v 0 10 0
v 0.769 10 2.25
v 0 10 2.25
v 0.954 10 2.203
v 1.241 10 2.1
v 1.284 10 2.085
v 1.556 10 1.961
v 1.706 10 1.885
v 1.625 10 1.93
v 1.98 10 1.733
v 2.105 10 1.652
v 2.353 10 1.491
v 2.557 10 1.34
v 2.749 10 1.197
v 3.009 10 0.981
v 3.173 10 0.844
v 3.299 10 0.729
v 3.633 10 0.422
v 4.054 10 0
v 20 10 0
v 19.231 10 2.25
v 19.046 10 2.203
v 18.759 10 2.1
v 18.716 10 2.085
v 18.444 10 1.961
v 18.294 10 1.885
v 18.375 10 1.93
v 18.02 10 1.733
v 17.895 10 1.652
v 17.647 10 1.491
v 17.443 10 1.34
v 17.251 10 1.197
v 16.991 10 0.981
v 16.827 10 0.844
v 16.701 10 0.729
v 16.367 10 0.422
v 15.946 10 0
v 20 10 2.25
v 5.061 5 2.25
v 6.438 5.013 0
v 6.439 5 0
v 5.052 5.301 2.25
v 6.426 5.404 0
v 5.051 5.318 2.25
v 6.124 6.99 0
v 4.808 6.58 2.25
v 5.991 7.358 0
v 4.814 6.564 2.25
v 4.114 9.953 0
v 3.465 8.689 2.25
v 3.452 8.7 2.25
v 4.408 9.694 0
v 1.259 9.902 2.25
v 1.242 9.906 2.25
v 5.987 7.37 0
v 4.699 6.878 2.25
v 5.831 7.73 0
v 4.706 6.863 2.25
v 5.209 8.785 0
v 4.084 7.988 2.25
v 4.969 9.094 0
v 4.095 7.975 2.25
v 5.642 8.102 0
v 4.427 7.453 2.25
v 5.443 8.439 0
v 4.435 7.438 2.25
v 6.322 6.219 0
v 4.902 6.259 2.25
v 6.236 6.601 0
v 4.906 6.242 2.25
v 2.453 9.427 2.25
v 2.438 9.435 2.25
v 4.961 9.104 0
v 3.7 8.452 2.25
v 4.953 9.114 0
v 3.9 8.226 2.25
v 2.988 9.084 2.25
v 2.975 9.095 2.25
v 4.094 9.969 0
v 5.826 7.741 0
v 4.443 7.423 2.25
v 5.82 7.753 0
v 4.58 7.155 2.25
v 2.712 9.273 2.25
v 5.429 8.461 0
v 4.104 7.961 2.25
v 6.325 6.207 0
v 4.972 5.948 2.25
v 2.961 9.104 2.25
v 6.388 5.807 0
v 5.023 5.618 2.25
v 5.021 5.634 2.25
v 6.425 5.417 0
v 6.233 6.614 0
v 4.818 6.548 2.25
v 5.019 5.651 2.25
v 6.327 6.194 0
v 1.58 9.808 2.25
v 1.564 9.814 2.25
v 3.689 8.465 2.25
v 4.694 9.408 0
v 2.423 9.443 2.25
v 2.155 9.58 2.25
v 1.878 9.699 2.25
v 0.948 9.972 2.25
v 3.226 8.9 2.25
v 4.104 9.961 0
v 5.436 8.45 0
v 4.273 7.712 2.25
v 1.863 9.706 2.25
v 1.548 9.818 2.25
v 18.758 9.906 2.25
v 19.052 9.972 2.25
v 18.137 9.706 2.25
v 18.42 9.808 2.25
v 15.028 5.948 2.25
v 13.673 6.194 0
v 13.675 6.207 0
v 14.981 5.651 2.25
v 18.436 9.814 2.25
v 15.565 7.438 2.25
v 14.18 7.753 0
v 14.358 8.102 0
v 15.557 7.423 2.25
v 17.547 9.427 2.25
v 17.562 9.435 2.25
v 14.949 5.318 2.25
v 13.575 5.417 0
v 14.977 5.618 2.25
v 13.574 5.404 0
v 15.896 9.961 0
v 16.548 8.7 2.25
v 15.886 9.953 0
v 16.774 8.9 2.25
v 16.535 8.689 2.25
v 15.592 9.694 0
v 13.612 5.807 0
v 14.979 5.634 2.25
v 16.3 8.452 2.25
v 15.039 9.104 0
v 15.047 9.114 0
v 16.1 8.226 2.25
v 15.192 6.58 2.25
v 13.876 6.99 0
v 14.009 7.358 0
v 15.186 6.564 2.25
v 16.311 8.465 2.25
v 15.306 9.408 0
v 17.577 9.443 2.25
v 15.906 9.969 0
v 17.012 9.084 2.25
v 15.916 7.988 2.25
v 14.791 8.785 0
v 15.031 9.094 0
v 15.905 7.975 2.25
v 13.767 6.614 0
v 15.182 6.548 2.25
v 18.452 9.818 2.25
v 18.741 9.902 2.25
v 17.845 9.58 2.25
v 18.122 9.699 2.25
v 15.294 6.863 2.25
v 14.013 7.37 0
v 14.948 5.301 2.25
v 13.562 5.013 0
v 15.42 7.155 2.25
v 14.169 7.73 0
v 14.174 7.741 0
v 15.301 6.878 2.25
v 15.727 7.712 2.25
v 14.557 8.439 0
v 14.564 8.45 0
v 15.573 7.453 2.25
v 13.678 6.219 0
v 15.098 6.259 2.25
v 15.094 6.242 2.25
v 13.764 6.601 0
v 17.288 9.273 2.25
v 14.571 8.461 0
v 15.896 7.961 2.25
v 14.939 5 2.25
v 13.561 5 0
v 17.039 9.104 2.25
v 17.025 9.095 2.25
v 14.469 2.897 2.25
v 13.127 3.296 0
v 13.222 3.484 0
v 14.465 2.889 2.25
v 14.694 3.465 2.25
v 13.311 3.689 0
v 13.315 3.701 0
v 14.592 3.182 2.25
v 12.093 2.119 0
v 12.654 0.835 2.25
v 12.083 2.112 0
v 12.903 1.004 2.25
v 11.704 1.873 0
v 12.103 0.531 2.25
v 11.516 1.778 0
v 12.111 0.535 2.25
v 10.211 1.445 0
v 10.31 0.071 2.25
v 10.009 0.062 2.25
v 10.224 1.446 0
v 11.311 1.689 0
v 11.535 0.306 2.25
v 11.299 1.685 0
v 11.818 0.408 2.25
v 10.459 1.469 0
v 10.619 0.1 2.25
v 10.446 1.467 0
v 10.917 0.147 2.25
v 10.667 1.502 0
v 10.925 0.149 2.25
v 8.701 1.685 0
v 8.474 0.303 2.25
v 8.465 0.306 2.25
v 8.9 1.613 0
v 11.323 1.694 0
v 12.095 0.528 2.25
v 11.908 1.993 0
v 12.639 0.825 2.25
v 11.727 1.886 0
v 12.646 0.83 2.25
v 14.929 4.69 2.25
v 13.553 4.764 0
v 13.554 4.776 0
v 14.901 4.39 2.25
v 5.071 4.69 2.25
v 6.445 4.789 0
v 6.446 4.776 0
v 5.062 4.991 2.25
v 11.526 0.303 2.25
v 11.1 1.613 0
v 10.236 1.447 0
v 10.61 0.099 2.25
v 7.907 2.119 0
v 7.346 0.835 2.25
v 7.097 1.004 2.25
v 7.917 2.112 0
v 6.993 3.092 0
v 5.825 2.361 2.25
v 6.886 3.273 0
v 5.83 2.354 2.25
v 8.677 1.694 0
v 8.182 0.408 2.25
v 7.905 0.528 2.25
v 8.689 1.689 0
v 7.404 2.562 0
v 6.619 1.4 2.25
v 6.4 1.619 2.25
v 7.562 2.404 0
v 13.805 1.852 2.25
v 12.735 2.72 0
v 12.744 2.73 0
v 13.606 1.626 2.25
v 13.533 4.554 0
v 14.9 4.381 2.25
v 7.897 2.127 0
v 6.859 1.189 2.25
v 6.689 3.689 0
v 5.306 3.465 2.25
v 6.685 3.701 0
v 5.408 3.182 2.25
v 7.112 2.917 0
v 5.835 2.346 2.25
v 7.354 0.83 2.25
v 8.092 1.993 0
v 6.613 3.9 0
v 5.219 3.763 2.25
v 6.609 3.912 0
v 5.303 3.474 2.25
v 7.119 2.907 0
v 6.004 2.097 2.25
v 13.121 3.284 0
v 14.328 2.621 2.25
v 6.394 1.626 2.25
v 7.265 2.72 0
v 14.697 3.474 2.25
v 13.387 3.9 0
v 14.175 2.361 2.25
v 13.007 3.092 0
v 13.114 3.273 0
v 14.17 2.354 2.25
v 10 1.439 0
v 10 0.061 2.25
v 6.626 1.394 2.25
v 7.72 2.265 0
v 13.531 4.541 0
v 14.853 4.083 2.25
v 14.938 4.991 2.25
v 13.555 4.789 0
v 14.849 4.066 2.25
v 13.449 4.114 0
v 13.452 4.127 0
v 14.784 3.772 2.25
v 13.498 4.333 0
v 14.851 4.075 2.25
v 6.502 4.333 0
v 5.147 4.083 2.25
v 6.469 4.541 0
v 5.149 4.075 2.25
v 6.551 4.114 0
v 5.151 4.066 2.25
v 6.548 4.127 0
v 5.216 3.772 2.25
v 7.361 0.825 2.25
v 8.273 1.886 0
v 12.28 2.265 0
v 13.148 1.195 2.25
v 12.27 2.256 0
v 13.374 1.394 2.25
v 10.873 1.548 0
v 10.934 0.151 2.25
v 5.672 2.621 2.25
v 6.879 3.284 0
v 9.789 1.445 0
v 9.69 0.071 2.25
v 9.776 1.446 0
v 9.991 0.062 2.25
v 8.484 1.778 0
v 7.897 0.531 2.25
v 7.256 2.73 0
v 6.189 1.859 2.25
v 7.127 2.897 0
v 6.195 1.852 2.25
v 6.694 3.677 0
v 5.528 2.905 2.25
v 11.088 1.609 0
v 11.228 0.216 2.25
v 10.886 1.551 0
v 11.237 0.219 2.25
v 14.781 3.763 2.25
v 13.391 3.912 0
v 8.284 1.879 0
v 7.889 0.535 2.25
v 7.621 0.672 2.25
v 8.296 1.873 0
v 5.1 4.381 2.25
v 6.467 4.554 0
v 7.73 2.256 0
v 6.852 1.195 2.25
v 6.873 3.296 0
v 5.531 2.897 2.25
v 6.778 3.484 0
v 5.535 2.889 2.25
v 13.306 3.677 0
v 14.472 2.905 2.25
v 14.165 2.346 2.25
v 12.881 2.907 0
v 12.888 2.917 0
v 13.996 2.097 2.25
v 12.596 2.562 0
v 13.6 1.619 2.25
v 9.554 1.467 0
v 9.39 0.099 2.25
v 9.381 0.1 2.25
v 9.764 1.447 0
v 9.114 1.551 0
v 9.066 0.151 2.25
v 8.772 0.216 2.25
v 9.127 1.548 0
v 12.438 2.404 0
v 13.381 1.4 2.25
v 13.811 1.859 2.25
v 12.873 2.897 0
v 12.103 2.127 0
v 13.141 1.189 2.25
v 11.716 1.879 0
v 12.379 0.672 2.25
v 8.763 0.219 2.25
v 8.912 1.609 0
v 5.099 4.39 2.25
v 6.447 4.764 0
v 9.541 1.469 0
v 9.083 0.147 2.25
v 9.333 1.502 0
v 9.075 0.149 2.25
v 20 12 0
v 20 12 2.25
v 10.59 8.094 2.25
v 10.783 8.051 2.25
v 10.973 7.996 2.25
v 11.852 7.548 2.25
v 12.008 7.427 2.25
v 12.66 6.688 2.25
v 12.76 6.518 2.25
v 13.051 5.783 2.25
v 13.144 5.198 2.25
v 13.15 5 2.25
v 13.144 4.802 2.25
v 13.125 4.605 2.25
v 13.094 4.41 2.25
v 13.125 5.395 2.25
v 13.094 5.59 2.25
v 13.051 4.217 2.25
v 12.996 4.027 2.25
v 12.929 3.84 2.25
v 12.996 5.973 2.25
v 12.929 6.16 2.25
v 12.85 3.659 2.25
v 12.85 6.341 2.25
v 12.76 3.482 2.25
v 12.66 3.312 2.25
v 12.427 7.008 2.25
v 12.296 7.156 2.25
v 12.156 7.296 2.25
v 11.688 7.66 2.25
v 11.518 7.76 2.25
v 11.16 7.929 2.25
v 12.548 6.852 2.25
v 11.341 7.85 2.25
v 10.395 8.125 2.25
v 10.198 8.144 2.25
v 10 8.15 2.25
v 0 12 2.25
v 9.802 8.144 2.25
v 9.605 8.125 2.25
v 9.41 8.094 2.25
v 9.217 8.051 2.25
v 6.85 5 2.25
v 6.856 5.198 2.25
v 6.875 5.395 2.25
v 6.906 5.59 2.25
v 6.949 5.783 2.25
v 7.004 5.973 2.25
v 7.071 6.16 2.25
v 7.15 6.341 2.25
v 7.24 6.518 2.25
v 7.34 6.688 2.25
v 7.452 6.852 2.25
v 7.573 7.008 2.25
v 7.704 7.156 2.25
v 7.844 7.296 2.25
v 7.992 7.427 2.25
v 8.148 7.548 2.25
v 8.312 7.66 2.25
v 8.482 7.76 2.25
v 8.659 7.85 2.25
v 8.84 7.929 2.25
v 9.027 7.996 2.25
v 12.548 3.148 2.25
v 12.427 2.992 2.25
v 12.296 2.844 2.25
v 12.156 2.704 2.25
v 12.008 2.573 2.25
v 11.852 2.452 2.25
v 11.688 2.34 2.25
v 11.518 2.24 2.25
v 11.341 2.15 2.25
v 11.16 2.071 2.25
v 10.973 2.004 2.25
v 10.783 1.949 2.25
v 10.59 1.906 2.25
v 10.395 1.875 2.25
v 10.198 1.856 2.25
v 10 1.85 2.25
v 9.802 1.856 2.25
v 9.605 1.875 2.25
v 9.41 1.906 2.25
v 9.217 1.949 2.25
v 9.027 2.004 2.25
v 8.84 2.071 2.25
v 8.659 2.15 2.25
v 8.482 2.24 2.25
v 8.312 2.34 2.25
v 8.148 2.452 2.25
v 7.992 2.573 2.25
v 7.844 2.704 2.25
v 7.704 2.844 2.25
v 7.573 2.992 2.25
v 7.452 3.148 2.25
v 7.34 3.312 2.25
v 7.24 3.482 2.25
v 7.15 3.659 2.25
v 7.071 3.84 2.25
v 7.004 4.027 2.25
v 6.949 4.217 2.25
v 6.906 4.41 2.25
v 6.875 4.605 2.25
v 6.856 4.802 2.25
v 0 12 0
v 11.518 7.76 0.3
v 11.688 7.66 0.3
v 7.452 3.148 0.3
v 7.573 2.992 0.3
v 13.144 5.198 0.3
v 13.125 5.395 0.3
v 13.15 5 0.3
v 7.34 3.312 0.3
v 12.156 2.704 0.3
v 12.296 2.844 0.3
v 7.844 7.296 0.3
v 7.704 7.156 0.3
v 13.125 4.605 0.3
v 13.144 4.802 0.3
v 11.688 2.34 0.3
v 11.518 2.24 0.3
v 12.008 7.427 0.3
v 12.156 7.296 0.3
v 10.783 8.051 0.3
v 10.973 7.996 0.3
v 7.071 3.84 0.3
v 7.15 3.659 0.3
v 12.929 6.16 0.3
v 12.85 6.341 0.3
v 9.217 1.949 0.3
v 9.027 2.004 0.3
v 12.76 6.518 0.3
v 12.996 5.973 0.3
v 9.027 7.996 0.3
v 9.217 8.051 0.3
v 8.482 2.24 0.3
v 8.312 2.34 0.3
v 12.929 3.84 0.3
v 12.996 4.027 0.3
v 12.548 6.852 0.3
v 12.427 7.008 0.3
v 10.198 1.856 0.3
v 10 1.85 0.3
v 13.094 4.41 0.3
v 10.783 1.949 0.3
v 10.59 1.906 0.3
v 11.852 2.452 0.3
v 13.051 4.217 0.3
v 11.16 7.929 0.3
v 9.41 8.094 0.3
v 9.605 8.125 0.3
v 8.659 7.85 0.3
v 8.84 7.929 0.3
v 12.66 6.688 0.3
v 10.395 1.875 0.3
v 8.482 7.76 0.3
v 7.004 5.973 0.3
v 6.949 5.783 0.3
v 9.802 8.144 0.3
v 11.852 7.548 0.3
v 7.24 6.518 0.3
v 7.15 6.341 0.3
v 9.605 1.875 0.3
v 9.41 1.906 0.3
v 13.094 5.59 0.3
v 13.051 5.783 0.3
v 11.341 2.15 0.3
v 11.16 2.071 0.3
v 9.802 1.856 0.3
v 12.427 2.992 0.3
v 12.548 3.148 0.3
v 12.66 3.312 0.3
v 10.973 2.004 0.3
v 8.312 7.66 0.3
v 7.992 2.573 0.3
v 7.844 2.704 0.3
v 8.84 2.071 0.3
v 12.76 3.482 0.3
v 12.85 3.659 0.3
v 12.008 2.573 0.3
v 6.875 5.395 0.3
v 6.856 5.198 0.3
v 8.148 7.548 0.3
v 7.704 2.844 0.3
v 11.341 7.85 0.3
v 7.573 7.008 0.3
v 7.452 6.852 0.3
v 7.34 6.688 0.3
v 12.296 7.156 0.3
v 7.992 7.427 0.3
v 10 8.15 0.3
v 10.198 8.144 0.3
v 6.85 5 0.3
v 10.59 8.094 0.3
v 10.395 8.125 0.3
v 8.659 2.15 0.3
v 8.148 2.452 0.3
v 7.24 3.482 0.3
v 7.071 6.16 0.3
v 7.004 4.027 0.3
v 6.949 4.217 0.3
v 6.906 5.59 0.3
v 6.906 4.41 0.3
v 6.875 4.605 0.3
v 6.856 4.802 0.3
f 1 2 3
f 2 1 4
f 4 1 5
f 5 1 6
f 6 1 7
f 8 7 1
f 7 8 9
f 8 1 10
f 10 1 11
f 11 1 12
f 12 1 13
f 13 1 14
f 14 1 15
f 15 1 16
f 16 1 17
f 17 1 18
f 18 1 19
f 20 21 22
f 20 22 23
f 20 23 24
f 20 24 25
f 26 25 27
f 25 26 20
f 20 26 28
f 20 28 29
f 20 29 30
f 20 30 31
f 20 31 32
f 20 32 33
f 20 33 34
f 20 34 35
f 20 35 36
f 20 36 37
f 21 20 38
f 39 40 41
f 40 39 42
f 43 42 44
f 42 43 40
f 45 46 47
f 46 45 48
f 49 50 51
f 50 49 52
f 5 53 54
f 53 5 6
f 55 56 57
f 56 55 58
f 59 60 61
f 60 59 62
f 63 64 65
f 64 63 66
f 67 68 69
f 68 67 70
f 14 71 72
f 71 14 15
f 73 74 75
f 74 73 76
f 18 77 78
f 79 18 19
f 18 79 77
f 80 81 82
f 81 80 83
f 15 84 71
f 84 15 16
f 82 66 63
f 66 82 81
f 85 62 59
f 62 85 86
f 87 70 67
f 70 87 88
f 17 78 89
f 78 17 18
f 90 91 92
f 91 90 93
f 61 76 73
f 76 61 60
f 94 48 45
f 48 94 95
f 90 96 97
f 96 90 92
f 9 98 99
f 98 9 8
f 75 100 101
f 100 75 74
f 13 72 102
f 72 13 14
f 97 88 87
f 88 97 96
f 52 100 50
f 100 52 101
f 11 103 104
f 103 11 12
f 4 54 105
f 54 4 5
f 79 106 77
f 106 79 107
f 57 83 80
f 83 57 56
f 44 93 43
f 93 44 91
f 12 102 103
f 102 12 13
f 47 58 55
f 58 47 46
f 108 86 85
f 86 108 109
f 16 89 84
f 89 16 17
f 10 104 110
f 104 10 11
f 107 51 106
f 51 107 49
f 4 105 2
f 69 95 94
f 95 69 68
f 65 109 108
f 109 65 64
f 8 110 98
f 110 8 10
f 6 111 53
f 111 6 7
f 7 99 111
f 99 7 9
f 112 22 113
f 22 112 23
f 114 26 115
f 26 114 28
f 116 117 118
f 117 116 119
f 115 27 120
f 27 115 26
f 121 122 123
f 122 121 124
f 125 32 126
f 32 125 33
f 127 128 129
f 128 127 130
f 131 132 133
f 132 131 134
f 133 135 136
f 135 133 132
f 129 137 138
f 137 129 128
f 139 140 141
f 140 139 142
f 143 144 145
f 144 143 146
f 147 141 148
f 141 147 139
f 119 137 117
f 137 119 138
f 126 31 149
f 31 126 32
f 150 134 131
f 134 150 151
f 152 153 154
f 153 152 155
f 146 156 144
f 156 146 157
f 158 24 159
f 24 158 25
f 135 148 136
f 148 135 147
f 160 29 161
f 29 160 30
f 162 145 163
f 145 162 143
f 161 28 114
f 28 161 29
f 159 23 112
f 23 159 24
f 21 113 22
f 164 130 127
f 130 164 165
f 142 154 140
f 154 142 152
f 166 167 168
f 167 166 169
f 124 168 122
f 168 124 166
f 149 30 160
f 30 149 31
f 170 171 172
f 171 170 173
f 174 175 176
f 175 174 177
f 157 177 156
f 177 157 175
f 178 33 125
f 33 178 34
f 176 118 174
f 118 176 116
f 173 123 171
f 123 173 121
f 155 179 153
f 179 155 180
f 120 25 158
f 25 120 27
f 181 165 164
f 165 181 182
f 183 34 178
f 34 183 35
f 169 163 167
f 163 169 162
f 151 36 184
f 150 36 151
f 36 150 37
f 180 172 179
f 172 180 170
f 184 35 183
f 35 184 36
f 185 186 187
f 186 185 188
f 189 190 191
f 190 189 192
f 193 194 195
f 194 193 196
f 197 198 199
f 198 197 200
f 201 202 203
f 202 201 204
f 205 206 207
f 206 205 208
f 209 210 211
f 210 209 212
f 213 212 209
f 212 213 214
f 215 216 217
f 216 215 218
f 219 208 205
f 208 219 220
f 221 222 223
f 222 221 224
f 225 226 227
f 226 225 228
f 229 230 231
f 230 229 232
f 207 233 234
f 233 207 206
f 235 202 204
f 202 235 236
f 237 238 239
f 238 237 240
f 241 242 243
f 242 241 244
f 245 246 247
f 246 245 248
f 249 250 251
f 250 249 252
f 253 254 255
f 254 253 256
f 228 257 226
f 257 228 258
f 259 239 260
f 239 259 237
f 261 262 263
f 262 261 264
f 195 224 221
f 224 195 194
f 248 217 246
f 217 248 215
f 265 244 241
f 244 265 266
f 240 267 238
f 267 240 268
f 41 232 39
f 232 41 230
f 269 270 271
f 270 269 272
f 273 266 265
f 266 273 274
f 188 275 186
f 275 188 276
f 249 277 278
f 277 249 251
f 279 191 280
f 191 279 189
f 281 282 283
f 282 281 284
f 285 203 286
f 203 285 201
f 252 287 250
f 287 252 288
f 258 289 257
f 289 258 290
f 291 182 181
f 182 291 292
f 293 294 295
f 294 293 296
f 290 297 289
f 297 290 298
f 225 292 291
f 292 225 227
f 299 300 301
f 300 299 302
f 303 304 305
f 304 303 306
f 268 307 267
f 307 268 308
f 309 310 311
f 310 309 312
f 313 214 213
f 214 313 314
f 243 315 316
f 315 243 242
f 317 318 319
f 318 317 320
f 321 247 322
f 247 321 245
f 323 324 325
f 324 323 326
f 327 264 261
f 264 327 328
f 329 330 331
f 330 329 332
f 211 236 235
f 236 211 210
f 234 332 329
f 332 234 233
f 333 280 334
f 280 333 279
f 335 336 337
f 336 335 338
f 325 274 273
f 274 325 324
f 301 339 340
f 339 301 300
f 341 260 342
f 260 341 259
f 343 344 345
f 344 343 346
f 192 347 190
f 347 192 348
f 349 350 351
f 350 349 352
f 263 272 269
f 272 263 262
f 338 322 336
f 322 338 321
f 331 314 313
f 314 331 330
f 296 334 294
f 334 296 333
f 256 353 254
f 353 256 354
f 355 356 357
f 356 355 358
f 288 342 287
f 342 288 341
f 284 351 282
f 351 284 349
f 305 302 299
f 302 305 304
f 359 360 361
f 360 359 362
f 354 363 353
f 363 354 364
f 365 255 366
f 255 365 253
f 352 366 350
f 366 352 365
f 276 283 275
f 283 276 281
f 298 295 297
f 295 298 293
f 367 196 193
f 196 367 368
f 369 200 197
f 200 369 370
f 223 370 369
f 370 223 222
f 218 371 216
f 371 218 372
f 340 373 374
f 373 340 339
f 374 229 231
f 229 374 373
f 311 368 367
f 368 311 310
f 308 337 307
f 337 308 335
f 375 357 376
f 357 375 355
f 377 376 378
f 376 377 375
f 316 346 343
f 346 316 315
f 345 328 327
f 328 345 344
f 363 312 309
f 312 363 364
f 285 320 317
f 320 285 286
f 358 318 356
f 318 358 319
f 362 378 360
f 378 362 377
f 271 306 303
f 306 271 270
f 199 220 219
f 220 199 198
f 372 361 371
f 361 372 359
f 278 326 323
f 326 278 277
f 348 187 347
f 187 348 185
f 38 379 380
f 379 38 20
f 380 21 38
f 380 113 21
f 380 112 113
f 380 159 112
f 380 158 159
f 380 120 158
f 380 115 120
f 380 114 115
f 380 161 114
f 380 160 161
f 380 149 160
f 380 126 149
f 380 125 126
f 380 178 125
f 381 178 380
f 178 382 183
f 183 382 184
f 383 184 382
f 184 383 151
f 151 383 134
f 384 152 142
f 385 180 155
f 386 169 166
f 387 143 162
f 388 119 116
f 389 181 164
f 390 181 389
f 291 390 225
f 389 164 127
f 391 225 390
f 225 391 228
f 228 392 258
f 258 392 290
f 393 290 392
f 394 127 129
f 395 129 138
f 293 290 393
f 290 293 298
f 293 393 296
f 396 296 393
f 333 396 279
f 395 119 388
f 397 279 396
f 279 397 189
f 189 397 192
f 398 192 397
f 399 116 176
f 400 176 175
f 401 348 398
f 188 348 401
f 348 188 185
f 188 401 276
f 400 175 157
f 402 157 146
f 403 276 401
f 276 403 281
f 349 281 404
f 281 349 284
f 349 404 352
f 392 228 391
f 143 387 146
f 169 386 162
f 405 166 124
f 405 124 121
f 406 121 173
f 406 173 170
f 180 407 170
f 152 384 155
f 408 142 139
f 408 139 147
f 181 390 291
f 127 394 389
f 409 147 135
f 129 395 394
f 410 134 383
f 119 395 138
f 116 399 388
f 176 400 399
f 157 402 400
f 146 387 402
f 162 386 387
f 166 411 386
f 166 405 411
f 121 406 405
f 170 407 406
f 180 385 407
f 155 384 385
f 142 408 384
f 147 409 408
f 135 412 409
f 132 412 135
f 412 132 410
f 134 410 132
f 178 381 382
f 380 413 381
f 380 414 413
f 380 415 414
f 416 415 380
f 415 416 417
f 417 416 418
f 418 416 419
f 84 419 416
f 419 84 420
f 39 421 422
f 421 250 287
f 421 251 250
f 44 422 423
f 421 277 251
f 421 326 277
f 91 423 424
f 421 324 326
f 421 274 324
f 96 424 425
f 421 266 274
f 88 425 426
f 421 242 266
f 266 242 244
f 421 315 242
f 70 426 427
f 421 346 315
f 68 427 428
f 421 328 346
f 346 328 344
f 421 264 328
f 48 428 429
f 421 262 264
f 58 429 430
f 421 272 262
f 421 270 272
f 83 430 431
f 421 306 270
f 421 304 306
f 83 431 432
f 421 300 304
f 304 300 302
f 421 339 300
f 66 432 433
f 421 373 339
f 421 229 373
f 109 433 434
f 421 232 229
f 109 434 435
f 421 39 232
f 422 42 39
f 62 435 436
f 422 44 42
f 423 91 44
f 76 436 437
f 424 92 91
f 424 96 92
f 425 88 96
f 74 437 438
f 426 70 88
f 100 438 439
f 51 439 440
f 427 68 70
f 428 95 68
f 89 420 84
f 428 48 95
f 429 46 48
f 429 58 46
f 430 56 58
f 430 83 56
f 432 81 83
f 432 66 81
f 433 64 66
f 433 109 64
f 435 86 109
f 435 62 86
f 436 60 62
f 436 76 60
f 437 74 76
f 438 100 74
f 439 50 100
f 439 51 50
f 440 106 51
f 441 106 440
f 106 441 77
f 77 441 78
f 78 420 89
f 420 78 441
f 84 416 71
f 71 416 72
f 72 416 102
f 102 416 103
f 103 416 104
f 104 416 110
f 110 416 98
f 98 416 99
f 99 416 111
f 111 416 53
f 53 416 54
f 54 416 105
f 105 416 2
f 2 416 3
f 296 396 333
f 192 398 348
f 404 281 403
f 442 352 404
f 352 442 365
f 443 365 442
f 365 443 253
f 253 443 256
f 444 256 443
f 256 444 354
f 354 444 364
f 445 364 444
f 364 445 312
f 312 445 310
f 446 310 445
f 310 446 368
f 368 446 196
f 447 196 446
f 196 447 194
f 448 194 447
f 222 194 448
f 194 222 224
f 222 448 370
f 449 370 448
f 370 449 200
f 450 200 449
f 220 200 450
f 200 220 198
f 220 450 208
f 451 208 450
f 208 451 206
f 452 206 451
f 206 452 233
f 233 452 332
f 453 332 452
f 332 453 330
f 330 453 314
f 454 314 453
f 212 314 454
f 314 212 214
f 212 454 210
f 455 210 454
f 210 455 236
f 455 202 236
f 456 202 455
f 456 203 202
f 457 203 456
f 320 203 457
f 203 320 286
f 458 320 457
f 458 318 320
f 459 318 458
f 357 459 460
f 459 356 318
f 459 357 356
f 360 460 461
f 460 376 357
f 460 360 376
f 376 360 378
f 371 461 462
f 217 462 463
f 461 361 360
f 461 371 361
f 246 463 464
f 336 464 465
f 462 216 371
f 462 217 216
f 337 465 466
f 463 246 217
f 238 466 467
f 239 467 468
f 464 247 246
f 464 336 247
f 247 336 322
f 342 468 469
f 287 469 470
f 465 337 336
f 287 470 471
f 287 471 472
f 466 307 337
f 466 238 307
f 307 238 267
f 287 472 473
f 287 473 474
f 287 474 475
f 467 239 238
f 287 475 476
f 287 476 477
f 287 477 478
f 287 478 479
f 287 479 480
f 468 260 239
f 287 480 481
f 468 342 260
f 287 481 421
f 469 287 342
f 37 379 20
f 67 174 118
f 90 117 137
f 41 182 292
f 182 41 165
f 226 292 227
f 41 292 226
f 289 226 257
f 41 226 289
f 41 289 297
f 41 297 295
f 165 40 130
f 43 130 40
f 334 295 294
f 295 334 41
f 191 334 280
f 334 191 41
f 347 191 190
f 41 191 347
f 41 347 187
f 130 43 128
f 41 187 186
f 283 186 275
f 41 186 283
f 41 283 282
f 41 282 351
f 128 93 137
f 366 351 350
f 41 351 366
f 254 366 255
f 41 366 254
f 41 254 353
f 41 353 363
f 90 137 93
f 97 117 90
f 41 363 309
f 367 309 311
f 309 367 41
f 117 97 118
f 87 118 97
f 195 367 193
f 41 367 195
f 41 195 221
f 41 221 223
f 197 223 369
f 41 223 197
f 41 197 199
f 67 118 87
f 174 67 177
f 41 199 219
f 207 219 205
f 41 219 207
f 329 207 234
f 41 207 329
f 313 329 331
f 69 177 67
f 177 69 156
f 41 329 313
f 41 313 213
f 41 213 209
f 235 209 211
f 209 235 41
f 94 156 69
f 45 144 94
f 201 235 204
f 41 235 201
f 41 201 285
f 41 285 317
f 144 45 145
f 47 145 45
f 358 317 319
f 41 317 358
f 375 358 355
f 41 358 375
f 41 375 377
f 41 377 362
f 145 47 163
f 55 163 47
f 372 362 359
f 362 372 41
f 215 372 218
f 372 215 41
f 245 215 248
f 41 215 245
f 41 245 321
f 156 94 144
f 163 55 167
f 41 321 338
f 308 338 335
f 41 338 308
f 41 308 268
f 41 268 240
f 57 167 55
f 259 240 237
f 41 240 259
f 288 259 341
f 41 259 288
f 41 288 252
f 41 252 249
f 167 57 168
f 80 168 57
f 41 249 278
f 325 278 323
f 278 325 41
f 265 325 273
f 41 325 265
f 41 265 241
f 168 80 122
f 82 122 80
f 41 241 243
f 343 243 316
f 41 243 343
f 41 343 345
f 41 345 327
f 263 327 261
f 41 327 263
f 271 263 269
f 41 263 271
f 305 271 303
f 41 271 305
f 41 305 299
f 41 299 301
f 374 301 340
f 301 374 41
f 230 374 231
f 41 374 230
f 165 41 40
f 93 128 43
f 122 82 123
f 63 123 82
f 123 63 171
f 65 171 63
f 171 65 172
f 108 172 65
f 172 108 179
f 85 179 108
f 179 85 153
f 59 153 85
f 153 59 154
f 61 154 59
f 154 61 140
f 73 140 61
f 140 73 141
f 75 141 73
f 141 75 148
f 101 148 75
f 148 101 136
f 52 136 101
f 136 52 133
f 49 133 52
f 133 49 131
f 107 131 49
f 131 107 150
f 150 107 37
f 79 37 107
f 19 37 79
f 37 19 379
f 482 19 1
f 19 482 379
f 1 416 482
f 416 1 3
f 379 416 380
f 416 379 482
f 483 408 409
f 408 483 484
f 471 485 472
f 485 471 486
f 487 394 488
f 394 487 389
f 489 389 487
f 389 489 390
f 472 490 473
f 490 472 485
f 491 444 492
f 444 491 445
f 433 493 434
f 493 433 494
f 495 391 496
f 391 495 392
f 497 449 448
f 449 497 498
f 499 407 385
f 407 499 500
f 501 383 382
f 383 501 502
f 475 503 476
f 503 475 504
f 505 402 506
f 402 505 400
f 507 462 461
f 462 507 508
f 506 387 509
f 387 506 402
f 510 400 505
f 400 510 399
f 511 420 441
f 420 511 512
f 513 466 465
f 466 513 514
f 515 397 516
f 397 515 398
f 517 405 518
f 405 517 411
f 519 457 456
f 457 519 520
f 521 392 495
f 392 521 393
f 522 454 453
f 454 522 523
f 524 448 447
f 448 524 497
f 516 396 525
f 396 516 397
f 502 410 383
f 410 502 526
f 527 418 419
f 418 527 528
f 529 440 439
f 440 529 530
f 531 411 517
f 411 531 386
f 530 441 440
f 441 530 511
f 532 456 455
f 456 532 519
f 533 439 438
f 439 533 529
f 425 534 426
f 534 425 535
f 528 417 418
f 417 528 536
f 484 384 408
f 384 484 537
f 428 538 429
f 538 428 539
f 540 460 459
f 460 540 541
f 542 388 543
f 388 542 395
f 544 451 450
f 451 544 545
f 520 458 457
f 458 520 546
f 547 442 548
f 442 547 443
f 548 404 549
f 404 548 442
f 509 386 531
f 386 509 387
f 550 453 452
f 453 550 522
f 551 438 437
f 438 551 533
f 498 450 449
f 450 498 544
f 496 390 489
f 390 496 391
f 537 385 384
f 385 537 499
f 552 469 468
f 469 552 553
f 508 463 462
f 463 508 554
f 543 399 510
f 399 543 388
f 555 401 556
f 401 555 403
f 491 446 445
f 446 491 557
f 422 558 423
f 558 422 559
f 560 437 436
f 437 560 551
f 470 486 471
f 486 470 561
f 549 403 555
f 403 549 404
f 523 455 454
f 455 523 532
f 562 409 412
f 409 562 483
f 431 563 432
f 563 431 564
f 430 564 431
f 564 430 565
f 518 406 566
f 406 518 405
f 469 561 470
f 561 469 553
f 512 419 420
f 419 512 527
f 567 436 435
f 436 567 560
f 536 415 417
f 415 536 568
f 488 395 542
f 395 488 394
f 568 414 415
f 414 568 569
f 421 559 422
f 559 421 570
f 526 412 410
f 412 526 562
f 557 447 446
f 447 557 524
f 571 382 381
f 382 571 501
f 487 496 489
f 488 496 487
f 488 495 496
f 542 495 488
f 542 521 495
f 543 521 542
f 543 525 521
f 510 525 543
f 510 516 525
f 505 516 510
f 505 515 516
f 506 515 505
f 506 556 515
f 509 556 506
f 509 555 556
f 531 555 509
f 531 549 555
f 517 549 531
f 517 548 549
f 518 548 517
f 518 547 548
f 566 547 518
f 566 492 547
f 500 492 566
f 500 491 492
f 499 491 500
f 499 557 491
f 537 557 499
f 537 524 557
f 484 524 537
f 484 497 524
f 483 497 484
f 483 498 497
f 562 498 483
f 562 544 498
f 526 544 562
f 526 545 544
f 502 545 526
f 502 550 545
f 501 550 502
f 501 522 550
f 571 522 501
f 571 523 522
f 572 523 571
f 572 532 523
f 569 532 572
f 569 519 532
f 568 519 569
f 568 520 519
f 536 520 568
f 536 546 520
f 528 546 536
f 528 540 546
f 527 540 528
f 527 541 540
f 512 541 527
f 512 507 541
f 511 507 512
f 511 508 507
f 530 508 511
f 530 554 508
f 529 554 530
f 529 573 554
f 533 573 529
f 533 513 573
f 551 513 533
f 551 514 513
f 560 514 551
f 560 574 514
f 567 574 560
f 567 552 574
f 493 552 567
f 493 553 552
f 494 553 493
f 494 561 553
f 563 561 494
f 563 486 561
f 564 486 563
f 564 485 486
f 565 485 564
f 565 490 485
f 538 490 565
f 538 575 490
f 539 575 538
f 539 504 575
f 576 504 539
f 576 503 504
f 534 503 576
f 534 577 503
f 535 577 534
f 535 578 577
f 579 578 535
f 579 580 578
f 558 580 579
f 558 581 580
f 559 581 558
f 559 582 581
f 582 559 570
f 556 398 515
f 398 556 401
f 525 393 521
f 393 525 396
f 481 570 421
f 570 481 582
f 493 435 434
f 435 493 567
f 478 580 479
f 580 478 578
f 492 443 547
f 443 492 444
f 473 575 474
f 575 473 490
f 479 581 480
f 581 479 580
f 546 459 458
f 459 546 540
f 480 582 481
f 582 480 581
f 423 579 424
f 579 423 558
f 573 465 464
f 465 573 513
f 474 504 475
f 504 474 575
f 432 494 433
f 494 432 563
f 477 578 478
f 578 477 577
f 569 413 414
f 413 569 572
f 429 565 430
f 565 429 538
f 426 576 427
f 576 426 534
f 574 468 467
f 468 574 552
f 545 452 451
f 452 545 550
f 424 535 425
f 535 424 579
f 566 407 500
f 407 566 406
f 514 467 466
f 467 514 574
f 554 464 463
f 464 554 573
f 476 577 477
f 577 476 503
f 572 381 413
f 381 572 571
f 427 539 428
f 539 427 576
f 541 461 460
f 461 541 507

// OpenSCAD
// file: ../bezel_config.scad
// =====================================================
// =             MISC. MODEL SETTINGS                  =
// =====================================================

// This generates solid roofs where there are holes that
// may otherwise be difficult to print without external support.
MODEL_SUPPORT_FOR_HANGING_CIRCLES=true;

// The thickness of support material to print that will
// fill in holes in ceilings. I recommend one print layer.
SUPPORT_LAYER_H=0.25;

// Number of faces in a "circle".
// 360 gives a pretty smooth circle on most printers.
// 100 has some visible edges but renders faster. Good for development.
$fn=360;

// Certain cuts and other model features are oversized
// by this marginal amount to eliminate rendering artifacts.
// This should not actually change the shape of the part
// if designed properly, and the change would be negligble anyway.
// Consider changing this to 0 for print renders.
// Use 0.1 or smaller for viewing quick renders.
NOTHING=0.1;

// =====================================================
// =               SIZE DEFINITIONS                    =
// =====================================================
// This section allows you to store some key measurements
// These numbers do not get applied to the models directly.
// Instead, use them in the GLOBAL CONFIGURATIONS sections
// below or as arguments to individual part modules in the
// PART CONSTRUCTION section.

_CHAMFER_WIDTH=3.25;
_FLAT_WIDTH=0.75;
LARGE_BEZEL_OUTER_DIAMETER=40.25*2;

SMALL_BEZEL_OUTER_DIAMETER=28.5*2;

YOKE_BEZEL_INNER_DIAMETER=49.2;
YOKE_FLAT_FROM_CENTER=46-YOKE_BEZEL_INNER_DIAMETER/2;

ENCODER_HEIGHT=7;
ENCODER_MAJOR_WIDTH=13;
ENCODER_MINOR_WIDTH=12.5;
ENCODER_SHAFT_DIAMETER=7.3;

BUTTON_HEIGHT=10.8+0.75;
BUTTON_MAJOR_WIDTH=7.5;
BUTTON_MINOR_WIDTH=7.5;
BUTTON_SHAFT_DIAMETER=6.5;
_BUTTON_HEIGHT_ABOVE_PANEL=BUTTON_HEIGHT-ENCODER_HEIGHT;


// =====================================================
// =           BASIC GLOBAL CONFIGURATIONS             =
// =====================================================

NUM_OUTER_POTS=0;

od=LARGE_BEZEL_OUTER_DIAMETER;

pot_h=ENCODER_HEIGHT;
pot_shaft_hole_d=ENCODER_SHAFT_DIAMETER;
pot_major=ENCODER_MAJOR_WIDTH;
pot_minor=ENCODER_MINOR_WIDTH;


// Total bezel height is divided into three regions: Tab (sits behind the panel), Embeded (in the panel), and Raised (above the panel).
panel_thickness=5.3; // Thickness of the panel material (the Embeded portion of the bezel)
bezel_height_above_panel=pot_h-7; // For flush bezel, set this to 0.

// Do not modify
_or=od/2;

screw_position_offset=4.75;
screw_position_r=_or+screw_position_offset;
screw_tab_w=10;
screw_socket_od=3.15*2;
screw_socket_id=1.5*2;
screw_socket_h=3;
tab_socket_backstop_h=0.75; // Thickness of the "bottom" of the screw socket, or 0 to disable.
tab_socket_backstop_hole_id=1; //.8*2; // Diameter of a smaller hole in the bottom of the socket, or 0 for none.
backstop_t=1.5;

pot_position_offset=screw_position_offset+1;
pot_position_r=_or+pot_position_offset;
pot_tab_major=25;
pot_tab_fillet_r=4.675;
_pot_tab_circle_overlap=_or - sqrt(pow(_or,2)-pow((pot_tab_major/2),2)); // Arc height as fn of chord length and radius
pot_tab_minor= 2*(pot_position_r - _or + _pot_tab_circle_overlap);
pot_wire_cut_w=8.5;
pot_wire_cut_h=2.5;
total_h=pot_h + 1;

// Calculations for modeling. Do not modify
bezel_od=od-2*_FLAT_WIDTH;
id=bezel_od-2*_CHAMFER_WIDTH;
_bezel_offset=(bezel_od-id)/2;
_top_t=(od-bezel_od)/2;
_tab_base_h=total_h-panel_thickness-bezel_height_above_panel;
_tab_extension_l=screw_position_r-id/2;
// main file
include <../bezel_config.scad>;
monitor_frame_t=0.45;
tab_mount_w=10;
tab_hold_w=10;
tab_w=tab_mount_w + tab_hold_w;
tab_t=_tab_base_h-monitor_frame_t;
hole_spacing=10;
n_holes=2;
tab_l=n_holes*hole_spacing;
hole_d1=3;
hole_d2=6;
magnet_d=6.3;
magnet_offset=0.3;


locator_d1=7;
locator_d2=tab_hold_w;

$fn=100;


module frame_tab() {
    difference() {
        cube([tab_l, tab_w, tab_t]);
        translate([hole_spacing/2, tab_mount_w/2, -NOTHING]) {
            for (i = [0:n_holes-1]) {
                translate([hole_spacing*i, 0, 0]) cylinder(d1=hole_d1, d2=hole_d2, h=tab_t + 2*NOTHING);
            }
            for( i= [1:n_holes-1]) {
                translate([hole_spacing*i - hole_spacing/2, tab_mount_w/2 + tab_hold_w/2, 0]) {
                    cylinder(d1=locator_d1, d2=locator_d2, h=tab_t+2*NOTHING);

                    translate([-hole_spacing,0,0]) difference() {
                        translate([0, 0, 0]) cube([2*hole_spacing, tab_mount_w/2, tab_t+2*NOTHING]);
                        translate([0,0,0]) cylinder(r1=hole_spacing-locator_d1/2, r2=hole_spacing-locator_d2/2, h=tab_t+2*NOTHING);
                        translate([2*hole_spacing,0,0]) cylinder(r1=hole_spacing-locator_d1/2, r2=hole_spacing-locator_d2/2, h=tab_t+2*NOTHING);
                    }

                }
            }
        }
        
    }
}

module bezel_tab() {
    difference() {
        cube([tab_l, tab_mount_w+2, tab_t]);
        translate([0, -tab_mount_w, 0]) frame_tab();
        translate([hole_spacing, tab_mount_w/2, magnet_offset]) {
            for (i = [0:n_holes-2]) {
                translate([hole_spacing*i, 0, 0]) cylinder(d=magnet_d, h=tab_t+2*NOTHING);
            }
        }

        if (n_holes > 2) {
            translate([3*hole_spacing/2, tab_mount_w, -NOTHING]) {
                translate([0, -1, 2]) cube([hole_spacing*(n_holes-3), 2, 2]);
                for (i = [0:n_holes - 3]) {
                    translate([hole_spacing*i, 0, 0]) {
                        cylinder(d1=1, d2=4, h=tab_t+2*NOTHING);
                        rotate([0,0,45]) translate([-1, -tab_mount_w/2, 2]) cube([2, tab_mount_w/2, 2]);
                        rotate([0,0,-45]) translate([-1, -tab_mount_w/2, 2]) cube([2, tab_mount_w/2, 2]);
                    }
                }
            }
        }
    }
}

bezel_tab();
// translate([0,-tab_mount_w - 2, 0]) frame_tab();
// frame_tab();
